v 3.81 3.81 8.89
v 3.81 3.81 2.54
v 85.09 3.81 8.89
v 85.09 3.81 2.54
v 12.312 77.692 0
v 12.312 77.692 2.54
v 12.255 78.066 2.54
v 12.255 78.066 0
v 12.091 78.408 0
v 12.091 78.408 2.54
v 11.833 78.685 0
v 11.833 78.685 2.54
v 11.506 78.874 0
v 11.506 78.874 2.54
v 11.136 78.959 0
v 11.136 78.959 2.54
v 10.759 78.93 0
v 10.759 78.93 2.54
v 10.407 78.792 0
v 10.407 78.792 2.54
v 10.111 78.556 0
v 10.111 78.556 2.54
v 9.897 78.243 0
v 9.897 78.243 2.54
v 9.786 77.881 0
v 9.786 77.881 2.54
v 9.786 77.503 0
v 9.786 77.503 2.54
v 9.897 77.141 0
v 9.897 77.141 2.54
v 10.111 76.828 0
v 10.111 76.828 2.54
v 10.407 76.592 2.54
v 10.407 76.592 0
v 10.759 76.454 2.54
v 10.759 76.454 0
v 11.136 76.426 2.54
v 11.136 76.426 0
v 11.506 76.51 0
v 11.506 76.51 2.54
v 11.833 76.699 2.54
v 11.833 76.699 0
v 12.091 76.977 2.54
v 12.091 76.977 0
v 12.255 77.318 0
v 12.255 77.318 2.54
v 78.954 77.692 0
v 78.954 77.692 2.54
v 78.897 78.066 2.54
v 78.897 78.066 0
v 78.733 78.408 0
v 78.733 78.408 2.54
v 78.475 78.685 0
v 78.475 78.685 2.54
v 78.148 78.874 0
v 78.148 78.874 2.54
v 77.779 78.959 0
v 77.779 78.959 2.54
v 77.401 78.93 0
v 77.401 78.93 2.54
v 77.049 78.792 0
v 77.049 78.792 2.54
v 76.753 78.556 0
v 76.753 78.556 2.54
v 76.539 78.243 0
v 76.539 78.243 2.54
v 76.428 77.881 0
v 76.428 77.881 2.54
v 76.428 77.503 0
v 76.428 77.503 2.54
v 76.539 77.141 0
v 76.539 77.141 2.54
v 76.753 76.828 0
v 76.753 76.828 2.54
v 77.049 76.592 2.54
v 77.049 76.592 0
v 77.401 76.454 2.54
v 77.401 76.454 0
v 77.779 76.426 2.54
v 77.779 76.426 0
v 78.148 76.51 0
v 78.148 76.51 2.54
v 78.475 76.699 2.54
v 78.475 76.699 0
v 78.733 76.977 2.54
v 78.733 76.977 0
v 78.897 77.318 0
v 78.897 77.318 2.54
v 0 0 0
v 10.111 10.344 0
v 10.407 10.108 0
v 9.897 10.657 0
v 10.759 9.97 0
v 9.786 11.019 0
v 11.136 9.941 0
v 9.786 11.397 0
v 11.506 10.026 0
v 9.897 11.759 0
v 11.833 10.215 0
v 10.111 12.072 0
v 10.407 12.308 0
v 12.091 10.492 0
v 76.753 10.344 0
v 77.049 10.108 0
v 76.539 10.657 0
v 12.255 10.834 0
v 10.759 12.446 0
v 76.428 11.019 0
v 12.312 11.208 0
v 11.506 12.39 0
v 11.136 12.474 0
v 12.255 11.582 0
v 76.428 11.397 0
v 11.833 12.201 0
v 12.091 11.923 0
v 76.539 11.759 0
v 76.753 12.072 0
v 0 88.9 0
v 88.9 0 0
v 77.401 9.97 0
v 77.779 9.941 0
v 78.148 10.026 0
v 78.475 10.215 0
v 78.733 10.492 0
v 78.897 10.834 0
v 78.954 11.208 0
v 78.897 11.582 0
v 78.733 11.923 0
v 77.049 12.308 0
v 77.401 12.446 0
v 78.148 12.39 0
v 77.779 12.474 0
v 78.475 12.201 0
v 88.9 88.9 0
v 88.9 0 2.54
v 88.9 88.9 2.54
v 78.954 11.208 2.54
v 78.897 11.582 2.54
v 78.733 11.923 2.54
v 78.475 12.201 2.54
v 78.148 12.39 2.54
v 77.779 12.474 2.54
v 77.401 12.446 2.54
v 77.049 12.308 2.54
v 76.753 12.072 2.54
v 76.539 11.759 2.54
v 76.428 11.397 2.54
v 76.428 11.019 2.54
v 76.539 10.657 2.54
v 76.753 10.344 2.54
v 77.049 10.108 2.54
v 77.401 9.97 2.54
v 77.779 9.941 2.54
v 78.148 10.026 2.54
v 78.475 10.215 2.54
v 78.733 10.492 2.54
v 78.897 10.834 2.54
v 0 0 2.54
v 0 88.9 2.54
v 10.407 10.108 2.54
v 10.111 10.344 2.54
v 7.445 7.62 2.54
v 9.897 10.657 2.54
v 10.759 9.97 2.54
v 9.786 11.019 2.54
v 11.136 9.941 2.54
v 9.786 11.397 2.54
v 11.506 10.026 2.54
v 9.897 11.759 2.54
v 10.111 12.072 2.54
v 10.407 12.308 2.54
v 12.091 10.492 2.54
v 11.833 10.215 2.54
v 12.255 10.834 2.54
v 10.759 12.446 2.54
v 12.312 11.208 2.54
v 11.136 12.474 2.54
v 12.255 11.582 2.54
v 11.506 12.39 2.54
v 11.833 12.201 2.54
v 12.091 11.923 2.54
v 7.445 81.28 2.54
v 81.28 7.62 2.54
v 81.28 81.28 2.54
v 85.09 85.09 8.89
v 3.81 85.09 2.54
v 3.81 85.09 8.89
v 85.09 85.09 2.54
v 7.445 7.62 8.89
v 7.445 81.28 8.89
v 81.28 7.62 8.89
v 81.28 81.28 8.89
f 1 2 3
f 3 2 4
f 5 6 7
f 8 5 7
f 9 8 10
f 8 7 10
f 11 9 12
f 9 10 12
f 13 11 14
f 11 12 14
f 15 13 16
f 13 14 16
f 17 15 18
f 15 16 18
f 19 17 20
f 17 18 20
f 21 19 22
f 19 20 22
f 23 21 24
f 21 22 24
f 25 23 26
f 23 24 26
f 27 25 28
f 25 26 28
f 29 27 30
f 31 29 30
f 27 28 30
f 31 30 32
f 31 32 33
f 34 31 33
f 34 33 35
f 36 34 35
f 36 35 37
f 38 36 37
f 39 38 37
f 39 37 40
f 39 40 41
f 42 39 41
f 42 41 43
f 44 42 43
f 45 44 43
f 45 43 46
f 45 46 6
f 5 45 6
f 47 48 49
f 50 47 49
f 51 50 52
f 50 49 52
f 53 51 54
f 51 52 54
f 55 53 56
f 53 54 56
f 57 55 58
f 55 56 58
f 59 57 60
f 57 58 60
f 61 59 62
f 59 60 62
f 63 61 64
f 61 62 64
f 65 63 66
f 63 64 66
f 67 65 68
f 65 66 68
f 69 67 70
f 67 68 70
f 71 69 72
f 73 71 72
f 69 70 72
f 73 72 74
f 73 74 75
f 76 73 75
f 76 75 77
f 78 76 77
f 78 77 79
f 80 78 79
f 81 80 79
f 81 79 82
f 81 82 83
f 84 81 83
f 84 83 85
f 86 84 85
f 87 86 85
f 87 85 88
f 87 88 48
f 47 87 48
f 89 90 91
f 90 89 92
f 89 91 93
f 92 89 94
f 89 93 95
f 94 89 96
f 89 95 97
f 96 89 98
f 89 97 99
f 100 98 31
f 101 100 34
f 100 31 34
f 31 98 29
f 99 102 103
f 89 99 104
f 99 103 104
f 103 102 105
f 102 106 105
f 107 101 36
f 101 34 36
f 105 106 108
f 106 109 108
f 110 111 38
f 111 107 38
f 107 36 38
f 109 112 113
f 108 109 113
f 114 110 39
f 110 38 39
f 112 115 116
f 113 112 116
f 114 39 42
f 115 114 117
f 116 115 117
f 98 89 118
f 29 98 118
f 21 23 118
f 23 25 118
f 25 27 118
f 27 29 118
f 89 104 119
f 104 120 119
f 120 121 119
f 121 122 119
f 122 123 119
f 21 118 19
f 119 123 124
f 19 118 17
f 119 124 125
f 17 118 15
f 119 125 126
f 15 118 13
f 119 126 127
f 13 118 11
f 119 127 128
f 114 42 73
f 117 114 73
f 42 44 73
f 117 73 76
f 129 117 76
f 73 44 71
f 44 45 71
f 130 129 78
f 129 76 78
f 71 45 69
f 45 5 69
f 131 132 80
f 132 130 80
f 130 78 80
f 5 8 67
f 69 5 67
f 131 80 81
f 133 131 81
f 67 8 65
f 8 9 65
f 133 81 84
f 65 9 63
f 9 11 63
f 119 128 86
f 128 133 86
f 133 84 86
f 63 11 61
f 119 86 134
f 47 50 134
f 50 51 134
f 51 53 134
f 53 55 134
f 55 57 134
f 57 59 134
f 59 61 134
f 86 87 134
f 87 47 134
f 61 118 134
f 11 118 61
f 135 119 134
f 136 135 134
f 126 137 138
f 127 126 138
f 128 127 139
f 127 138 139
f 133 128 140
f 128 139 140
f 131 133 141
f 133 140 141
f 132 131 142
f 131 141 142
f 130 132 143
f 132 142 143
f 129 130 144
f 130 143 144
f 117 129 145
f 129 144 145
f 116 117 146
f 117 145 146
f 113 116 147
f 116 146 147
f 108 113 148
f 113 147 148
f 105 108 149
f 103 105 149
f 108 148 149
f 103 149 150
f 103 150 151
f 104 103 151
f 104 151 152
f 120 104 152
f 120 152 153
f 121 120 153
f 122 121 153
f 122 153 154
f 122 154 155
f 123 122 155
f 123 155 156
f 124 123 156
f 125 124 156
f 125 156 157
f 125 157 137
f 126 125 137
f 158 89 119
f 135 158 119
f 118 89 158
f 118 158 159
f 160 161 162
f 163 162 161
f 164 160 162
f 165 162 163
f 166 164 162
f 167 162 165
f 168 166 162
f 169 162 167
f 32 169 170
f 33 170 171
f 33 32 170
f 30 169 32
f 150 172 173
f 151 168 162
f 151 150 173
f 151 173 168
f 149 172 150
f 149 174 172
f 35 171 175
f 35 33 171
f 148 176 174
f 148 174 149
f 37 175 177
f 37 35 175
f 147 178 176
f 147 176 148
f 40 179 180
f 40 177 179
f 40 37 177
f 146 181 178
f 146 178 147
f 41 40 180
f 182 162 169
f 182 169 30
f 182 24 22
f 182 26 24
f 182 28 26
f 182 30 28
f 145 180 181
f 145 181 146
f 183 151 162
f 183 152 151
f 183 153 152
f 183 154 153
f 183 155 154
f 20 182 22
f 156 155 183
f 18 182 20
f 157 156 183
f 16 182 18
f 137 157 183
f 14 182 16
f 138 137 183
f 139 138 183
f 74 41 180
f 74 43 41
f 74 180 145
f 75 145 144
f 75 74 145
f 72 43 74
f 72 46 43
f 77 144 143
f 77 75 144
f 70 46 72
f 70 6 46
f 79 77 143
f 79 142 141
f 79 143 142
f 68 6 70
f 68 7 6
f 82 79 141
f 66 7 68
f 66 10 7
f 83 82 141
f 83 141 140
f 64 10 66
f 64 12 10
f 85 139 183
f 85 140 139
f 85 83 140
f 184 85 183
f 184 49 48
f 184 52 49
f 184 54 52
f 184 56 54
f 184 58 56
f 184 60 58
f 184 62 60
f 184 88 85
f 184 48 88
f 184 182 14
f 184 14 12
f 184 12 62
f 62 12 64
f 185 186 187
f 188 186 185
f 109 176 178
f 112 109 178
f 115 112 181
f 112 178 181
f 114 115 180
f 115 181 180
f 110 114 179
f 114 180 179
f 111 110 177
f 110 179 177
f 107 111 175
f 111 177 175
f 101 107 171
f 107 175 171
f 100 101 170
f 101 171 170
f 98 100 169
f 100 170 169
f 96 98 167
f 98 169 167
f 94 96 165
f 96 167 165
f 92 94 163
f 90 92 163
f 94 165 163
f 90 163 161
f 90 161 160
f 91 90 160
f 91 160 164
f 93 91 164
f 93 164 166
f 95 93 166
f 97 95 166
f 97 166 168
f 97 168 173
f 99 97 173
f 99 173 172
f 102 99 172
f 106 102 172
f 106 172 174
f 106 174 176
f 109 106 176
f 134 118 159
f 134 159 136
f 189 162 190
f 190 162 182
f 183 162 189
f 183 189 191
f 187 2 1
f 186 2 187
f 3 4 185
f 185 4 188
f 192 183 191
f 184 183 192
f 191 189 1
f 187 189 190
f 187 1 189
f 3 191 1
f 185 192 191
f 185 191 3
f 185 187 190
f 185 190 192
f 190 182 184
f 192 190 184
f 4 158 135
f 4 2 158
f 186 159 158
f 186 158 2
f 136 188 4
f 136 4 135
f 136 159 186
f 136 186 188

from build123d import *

# Parameters (mm, degrees)
F0_W     = 88.9
F0_H     = 88.9
F1_DEPTH = 2.54
F2_W     = 81.28
F2_H     = 81.28
F2_W_2   = 73.834833
F2_H_2   = 73.66
F3_DEPTH = 6.35
F4_R     = 1.27
F5_DEPTH = 2.541


with BuildPart() as f1:
    # F0 (on Top) → F1 (new body)
    with BuildSketch(Plane.XY):
        with Locations((44.45, 44.45)):
            Rectangle(F0_W, F0_H)
    extrude(amount=F1_DEPTH)

    # F2 (on face) → F3 (join)
    with BuildSketch(Plane.XY.offset(2.54)):
        with Locations((44.45, 44.45)):
            Rectangle(F2_W, F2_H)
        with Locations((44.362583, 44.45)):
            Rectangle(F2_W_2, F2_H_2, mode=Mode.SUBTRACT)
    extrude(amount=F3_DEPTH)

    # F4 (on face) → F5 (cut, through all)
    with BuildSketch(Plane.XY.offset(2.54)):
        with Locations((11.041525, 77.692158)):
            Circle(F4_R)
        with Locations((77.683642, 77.692158)):
            Circle(F4_R)
        with Locations((77.683642, 11.207842)):
            Circle(F4_R)
        with Locations((11.041525, 11.207842)):
            Circle(F4_R)
    extrude(amount=-F5_DEPTH, mode=Mode.SUBTRACT)


solid = f1.part
